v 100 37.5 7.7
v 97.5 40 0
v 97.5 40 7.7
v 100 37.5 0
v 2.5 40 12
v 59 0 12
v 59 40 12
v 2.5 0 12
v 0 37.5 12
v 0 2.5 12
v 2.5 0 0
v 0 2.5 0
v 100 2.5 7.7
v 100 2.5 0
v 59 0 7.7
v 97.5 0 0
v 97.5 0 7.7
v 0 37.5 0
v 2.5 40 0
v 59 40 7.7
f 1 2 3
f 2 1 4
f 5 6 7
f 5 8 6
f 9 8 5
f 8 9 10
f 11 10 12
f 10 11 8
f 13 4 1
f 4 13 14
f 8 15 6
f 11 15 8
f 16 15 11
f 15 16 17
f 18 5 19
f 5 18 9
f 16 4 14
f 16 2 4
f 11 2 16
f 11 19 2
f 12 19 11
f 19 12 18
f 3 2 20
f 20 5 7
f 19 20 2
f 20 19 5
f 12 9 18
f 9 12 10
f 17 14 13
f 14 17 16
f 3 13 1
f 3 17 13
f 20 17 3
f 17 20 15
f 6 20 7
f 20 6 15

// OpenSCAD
$fn = 32;

// ----------------------------------------------------------------------
// Stepped bar: endstep, 100 x 40 x 12/7.7 mm
// ----------------------------------------------------------------------

// --- parameters (mm) ---
bar_l = 100;              // bar length, X
bar_w = 40;               // bar width, Y
plate_t = 12;             // thickness of the thick zone, Z
thin_t = 7.7;             // thickness of the thin zone
corner_c = 2.5;           // corner chamfer of the bar
step_cut = 4.3;           // material removed from the thin zone
step_x = 59;              // step position from the left end
depth_1 = 4.3;            // depth of cut 1 from the top face

profile = [[2.5, 0], [97.5, 0], [100, 2.5], [100, 37.5], [97.5, 40], [2.5, 40], [0, 37.5], [0, 2.5]];  // primary outline, 8 points, counter clockwise
void_1 = [[59, -1], [101, -1], [101, 41], [59, 41]];  // thin zone beyond the step, 4 points

// --- the one profile operation ---
difference() {
  linear_extrude(height = plate_t) polygon(points = profile);
  translate([0, 0, plate_t - depth_1])
    linear_extrude(height = depth_1 + 1) polygon(points = void_1);
}
